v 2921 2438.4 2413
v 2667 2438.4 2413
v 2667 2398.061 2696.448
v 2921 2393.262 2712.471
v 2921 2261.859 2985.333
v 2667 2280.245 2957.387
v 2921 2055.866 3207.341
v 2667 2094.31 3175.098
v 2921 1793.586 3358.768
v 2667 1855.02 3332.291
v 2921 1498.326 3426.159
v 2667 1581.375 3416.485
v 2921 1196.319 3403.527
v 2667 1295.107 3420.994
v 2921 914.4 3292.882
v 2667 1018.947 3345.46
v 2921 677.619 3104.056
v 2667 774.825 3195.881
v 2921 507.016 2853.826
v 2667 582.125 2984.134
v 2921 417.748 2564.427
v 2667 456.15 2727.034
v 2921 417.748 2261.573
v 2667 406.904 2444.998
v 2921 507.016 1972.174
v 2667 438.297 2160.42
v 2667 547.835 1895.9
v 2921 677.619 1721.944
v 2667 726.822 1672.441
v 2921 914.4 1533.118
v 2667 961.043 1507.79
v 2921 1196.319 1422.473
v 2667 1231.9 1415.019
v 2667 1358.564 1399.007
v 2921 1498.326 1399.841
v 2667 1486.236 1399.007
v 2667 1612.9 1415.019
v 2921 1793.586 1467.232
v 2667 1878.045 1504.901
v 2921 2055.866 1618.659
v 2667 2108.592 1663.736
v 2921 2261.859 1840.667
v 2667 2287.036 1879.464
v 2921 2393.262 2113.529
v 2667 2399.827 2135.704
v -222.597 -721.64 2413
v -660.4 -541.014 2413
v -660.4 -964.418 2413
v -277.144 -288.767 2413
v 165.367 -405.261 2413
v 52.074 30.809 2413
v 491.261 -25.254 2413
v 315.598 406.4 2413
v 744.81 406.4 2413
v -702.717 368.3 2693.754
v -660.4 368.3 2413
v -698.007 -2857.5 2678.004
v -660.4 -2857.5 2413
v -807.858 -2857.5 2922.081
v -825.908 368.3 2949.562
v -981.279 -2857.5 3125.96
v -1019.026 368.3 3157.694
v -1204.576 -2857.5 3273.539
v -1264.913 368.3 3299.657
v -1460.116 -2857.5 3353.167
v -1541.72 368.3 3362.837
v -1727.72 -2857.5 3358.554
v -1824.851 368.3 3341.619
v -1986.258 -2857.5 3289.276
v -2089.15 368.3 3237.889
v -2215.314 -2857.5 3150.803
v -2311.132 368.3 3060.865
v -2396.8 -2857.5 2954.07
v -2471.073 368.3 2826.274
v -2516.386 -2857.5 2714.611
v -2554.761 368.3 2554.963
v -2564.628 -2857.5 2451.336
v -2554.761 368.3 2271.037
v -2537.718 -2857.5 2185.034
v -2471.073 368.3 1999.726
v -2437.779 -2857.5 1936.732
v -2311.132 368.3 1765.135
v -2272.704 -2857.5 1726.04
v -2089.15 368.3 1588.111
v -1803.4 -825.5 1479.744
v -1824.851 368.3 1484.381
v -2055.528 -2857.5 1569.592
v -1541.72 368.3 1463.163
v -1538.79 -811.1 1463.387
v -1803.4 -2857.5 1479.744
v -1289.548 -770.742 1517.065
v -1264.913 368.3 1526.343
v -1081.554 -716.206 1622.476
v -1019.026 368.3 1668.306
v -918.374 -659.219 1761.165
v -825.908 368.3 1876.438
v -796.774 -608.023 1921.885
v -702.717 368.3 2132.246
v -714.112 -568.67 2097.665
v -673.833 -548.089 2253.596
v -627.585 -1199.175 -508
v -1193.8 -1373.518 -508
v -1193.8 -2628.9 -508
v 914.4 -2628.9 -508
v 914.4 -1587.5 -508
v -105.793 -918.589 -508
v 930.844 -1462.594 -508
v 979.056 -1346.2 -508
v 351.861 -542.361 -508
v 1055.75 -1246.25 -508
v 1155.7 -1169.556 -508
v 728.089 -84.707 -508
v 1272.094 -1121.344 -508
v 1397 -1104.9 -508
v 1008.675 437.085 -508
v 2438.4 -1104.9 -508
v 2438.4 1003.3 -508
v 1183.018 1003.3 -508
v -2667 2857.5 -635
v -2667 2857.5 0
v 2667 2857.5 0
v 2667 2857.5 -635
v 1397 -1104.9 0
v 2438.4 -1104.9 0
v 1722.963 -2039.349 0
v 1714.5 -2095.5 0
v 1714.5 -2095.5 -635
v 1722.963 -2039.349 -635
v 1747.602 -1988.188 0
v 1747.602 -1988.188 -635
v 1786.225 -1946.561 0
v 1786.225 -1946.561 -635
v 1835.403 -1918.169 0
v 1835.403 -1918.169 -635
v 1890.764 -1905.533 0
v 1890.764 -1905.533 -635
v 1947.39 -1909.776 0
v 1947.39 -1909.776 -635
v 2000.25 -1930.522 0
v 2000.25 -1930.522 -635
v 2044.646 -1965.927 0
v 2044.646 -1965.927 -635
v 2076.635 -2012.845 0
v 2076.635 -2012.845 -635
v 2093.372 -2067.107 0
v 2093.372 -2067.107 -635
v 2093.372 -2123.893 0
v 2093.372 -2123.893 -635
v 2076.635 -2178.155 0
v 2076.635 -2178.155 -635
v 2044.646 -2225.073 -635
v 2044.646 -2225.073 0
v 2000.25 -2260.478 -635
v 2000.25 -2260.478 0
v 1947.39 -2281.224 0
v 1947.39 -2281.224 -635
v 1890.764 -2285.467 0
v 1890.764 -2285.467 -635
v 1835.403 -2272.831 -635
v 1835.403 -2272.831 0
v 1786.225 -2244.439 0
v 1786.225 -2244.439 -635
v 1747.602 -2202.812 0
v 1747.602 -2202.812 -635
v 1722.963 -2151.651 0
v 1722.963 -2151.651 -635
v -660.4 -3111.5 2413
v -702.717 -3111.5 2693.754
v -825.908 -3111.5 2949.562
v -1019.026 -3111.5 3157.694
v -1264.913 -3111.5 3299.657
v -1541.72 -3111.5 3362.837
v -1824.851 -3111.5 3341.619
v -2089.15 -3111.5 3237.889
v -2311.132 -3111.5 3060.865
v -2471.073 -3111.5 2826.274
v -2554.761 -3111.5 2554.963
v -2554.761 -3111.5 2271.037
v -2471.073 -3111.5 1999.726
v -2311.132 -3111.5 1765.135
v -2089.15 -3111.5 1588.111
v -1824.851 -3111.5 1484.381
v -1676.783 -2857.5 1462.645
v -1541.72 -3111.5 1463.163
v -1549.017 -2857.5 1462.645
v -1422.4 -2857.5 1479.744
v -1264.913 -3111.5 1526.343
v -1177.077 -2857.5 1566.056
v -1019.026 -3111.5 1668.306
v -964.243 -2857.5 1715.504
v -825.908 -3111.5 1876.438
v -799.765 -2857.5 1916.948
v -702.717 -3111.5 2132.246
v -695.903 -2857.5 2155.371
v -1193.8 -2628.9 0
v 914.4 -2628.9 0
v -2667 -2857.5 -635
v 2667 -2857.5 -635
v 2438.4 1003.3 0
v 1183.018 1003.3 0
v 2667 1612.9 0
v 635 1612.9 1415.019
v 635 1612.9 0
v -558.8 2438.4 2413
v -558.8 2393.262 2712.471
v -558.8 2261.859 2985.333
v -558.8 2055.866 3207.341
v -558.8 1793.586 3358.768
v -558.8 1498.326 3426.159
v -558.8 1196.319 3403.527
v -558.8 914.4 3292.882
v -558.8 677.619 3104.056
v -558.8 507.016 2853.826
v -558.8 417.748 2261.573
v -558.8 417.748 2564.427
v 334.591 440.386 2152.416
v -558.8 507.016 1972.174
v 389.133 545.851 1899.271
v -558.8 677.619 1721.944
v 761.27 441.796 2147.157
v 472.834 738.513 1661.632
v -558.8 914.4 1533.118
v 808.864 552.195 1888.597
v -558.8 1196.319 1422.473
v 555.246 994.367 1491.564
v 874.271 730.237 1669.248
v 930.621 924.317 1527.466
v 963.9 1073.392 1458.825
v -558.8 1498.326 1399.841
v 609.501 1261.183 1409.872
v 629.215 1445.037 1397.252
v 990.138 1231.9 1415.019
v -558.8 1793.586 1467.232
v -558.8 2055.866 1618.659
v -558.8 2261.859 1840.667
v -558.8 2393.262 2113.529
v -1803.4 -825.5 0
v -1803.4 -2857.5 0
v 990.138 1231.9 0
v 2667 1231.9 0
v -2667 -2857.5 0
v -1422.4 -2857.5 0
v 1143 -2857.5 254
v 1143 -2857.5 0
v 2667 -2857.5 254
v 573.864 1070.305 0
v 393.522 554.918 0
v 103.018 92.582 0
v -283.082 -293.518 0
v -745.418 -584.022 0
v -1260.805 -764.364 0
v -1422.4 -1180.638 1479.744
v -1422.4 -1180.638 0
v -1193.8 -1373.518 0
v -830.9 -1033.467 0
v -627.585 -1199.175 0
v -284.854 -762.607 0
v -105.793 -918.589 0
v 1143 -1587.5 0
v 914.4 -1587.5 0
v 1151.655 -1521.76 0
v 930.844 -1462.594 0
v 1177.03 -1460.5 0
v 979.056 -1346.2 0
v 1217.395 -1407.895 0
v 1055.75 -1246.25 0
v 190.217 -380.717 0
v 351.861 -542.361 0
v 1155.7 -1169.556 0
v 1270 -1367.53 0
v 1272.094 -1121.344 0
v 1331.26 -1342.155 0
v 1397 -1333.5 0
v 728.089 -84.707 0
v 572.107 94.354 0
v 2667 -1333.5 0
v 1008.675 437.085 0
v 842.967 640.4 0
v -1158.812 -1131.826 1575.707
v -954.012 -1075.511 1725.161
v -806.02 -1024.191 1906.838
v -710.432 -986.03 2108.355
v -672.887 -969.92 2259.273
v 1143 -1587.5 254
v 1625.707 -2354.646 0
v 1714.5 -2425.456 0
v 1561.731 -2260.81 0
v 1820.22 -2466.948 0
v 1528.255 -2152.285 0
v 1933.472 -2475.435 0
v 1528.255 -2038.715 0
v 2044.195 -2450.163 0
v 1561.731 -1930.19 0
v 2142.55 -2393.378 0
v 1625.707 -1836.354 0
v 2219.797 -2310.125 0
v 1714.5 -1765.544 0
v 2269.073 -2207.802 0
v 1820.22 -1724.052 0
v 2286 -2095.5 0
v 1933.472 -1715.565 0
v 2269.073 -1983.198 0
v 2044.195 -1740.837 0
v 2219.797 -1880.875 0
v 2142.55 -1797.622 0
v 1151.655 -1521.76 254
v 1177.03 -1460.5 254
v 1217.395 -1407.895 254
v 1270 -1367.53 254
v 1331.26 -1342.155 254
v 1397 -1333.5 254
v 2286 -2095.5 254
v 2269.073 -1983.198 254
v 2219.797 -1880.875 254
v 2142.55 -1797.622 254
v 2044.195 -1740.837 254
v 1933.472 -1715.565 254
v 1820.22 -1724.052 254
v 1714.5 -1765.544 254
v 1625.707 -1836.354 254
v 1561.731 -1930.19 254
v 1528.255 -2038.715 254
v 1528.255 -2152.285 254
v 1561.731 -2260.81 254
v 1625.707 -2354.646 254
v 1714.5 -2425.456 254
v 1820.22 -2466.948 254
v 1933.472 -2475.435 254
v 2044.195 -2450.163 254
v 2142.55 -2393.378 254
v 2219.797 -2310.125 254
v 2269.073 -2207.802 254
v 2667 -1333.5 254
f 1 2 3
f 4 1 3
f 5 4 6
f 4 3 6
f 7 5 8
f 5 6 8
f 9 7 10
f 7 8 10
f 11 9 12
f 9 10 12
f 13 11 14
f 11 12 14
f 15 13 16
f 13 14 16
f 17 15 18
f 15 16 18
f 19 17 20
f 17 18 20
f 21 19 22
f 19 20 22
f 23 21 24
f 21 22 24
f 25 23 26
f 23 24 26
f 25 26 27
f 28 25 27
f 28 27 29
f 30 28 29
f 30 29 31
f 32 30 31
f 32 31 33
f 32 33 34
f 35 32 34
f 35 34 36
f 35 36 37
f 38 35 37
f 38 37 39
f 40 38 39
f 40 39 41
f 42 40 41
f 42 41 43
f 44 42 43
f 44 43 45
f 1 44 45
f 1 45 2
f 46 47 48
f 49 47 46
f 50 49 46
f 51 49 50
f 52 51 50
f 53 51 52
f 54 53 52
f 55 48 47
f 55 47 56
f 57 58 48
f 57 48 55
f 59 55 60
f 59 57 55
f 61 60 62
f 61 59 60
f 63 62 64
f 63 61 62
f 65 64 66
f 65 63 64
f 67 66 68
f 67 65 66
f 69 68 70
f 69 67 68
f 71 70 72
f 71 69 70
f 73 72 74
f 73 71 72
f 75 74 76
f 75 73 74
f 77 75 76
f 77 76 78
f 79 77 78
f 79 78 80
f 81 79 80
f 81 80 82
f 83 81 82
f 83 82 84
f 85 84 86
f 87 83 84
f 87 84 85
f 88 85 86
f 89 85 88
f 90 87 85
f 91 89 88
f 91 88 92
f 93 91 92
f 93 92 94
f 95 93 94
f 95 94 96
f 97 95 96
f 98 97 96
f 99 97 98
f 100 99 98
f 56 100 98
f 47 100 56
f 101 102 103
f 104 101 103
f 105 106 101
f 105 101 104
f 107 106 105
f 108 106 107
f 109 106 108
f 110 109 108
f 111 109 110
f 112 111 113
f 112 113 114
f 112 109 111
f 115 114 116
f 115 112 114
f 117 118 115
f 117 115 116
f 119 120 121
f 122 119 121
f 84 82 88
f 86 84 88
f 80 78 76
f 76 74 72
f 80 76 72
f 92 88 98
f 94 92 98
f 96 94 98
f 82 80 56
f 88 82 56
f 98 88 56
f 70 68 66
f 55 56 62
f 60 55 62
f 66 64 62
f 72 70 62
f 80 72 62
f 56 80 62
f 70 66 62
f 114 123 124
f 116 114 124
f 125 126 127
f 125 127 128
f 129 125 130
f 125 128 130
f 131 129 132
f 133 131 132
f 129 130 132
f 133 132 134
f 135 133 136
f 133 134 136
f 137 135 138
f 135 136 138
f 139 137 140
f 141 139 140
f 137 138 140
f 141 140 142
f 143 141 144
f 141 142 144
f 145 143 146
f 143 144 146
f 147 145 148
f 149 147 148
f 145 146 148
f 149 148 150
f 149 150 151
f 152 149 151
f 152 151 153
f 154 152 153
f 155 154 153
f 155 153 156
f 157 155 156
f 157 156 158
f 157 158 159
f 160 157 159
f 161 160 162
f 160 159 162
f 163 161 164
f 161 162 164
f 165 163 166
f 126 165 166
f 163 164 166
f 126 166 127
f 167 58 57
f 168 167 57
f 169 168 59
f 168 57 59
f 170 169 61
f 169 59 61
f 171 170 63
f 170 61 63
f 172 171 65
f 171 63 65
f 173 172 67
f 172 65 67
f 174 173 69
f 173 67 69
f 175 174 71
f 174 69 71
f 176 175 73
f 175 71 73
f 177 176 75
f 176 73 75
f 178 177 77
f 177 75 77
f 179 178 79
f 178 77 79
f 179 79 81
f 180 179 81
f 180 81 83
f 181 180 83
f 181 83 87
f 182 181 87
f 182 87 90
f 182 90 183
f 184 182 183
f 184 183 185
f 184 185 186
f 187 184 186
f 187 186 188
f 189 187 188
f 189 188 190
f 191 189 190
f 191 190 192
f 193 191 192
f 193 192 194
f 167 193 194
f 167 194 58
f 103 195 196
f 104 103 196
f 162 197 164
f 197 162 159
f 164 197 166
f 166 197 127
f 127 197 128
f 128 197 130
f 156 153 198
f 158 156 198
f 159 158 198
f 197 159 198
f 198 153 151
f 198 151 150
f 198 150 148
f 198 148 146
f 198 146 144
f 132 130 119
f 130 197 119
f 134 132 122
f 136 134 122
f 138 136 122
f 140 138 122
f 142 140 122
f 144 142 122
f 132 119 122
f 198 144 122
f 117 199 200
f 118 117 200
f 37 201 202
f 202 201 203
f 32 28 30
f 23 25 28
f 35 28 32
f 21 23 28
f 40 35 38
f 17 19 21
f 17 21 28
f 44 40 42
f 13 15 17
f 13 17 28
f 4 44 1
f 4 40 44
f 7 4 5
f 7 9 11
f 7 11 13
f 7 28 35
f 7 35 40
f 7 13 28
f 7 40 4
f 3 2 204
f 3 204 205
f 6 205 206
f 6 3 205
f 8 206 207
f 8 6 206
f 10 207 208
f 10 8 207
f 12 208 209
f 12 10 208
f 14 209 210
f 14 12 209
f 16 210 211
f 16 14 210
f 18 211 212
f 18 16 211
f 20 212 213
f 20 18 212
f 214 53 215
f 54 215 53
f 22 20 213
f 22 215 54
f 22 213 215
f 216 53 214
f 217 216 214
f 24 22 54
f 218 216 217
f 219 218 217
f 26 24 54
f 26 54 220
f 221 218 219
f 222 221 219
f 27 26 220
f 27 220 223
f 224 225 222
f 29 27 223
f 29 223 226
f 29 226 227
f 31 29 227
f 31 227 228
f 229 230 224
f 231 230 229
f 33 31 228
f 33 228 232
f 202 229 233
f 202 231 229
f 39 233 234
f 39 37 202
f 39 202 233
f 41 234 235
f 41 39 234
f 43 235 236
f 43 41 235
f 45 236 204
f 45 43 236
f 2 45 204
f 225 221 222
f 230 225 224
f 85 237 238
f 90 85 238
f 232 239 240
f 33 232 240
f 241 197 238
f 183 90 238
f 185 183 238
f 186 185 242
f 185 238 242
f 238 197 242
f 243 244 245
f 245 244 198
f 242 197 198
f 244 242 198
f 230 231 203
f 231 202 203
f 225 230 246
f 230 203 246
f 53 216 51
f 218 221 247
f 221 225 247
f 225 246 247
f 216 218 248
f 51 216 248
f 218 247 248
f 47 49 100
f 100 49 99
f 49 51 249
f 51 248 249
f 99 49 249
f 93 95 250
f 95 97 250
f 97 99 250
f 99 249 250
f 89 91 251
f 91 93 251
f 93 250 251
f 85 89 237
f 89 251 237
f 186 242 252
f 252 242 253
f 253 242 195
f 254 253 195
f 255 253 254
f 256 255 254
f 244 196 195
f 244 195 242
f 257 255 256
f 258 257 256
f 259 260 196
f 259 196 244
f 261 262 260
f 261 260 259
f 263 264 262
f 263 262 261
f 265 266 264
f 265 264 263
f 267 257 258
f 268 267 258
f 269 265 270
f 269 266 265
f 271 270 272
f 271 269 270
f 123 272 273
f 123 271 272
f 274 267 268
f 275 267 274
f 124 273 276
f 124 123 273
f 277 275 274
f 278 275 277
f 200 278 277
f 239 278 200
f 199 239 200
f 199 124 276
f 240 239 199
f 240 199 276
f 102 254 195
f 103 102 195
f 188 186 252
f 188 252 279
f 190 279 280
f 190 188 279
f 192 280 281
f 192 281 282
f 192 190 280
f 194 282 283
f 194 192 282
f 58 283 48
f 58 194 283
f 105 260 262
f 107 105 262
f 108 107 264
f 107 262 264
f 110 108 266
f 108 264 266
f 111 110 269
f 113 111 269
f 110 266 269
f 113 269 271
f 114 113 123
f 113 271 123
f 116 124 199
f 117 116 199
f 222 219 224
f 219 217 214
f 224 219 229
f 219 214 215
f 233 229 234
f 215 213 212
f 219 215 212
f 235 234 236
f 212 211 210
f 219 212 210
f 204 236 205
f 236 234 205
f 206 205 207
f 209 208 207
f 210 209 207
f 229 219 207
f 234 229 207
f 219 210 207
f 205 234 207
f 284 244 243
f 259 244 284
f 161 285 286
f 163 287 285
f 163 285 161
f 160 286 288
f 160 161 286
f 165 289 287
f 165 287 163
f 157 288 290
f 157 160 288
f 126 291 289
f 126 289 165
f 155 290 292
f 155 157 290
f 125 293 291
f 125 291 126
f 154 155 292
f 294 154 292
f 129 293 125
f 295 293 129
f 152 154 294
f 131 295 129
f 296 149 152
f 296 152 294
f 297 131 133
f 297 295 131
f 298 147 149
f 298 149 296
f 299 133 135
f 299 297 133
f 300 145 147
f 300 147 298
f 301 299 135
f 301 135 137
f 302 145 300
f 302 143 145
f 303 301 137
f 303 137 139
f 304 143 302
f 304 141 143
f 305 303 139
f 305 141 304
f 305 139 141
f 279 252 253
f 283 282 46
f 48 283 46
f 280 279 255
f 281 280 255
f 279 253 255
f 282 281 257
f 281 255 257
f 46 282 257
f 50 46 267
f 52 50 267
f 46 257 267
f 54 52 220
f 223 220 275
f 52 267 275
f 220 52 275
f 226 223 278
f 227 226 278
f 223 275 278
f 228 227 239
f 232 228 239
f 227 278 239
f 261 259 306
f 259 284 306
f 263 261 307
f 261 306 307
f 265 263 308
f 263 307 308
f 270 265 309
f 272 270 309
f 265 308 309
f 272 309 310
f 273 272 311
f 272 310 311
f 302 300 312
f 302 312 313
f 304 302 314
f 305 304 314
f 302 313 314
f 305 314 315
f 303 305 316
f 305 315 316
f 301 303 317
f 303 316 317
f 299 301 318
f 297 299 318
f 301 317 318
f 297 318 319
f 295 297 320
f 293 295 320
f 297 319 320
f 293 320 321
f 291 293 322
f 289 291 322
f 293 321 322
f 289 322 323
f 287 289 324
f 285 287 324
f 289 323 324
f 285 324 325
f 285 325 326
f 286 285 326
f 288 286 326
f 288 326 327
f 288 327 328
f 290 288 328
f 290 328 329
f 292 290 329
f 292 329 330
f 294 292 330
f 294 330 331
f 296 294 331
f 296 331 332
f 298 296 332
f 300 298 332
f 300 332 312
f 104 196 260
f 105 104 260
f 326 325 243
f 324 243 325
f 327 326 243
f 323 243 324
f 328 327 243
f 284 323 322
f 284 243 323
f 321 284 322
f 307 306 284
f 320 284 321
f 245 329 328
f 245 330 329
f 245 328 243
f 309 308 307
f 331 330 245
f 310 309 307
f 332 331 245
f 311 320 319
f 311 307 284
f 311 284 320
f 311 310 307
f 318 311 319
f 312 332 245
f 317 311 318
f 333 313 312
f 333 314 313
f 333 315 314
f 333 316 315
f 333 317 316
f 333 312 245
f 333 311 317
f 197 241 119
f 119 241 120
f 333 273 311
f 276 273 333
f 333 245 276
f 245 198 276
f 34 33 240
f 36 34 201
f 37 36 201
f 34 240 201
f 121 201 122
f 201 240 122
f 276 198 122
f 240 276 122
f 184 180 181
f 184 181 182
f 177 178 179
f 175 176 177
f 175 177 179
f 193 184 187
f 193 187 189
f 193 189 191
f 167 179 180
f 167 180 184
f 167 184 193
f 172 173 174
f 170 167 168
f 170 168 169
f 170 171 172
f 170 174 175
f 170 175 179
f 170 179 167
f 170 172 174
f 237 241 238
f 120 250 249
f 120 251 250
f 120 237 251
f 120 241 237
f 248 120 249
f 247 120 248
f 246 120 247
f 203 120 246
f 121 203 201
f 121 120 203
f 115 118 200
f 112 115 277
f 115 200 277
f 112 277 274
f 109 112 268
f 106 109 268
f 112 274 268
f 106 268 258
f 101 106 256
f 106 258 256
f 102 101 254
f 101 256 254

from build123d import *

# Parameters (mm, degrees)
F0_W            = 5334
F0_H            = 5715
F1_DEPTH        = 635
F3_DEPTH        = 2413
F4_R            = 952.5
F5_DEPTH        = 254
F5_DEPTH_BACK   = 3225.8
F6_R            = 1016
F7_DEPTH        = 254
F7_DEPTH_BACK   = 3225.8
F8_W            = 1524
F8_H            = 1524
F9_DEPTH        = 254
F10_R           = 254
F12_DEPTH       = 508
F14_D           = 381
F14_CBORE_D     = 762
F14_CBORE_DEPTH = 254


with BuildPart() as f1:
    # F0 (on Top) → F1 (new body)
    with BuildSketch(Plane.XY):
        Rectangle(F0_W, F0_H)
    extrude(amount=-F1_DEPTH)

    # F2 (on face) → F3 (join)
    with BuildSketch(Plane.XY):
        with BuildLine():
            Line((-1803.4, -825.5), (-1803.4, -2857.5))
            Line((-1803.4, -2857.5), (-1422.4, -2857.5))
            Line((-1422.4, -2857.5), (-1422.4, -1180.638144))
            ThreePointArc((-1422.4, -1180.638144), (190.216859, -380.716859), (990.138144, 1231.9))
            Line((990.138144, 1231.9), (2667, 1231.9))
            Line((2667, 1231.9), (2667, 1612.9))
            Line((2667, 1612.9), (635, 1612.9))
            ThreePointArc((635, 1612.9), (-79.190825, -111.309175), (-1803.4, -825.5))
        make_face()
    extrude(amount=F3_DEPTH)

    # F4 (on face) → F5 (join, two sides)
    with BuildSketch(Plane.XZ.offset(2857.5)) as f5_sk:
        with Locations((-1612.9, 2413)):
            Circle(F4_R)
    extrude(amount=F5_DEPTH)
    extrude(f5_sk.sketch, amount=-F5_DEPTH_BACK)

    # F6 (on face) → F7 (join, two sides)
    with BuildSketch(Plane.YZ.offset(2667)) as f7_sk:
        with Locations((1422.4, 2413)):
            Circle(F6_R)
    extrude(amount=F7_DEPTH)
    extrude(f7_sk.sketch, amount=-F7_DEPTH_BACK)

    # F8 (on face) → F9 (join)
    with BuildSketch(Plane.XY):
        with Locations((1905, -2095.5)):
            Rectangle(F8_W, F8_H)
    extrude(amount=F9_DEPTH)

    # F10
    f10_edges = [f1.edges().sort_by_distance(p)[0] for p in [
        (1143, -1333.5, 127),
    ]]
    fillet(f10_edges, radius=F10_R)

    # F11 (on face) → F12 (cut)
    with BuildSketch(Plane.XY):
        with BuildLine():
            ThreePointArc((1183.017894, 1003.3), (351.861469, -542.361469), (-1193.8, -1373.517894))
            Line((-1193.8, -1373.517894), (-1193.8, -2628.9))
            Line((-1193.8, -2628.9), (914.4, -2628.9))
            Line((914.4, -2628.9), (914.4, -1587.5))
            ThreePointArc((914.4, -1587.5), (1055.750267, -1246.250267), (1397, -1104.9))
            Line((1397, -1104.9), (2438.4, -1104.9))
            Line((2438.4, -1104.9), (2438.4, 1003.3))
            Line((2438.4, 1003.3), (1183.017894, 1003.3))
        make_face()
    extrude(amount=-F12_DEPTH, mode=Mode.SUBTRACT)

    # F14 (through all)
    with Locations(Plane.XY.offset(254)):
        with Locations((1905, -2095.5)):
            CounterBoreHole(F14_D / 2, F14_CBORE_D / 2, F14_CBORE_DEPTH)


solid = f1.part
